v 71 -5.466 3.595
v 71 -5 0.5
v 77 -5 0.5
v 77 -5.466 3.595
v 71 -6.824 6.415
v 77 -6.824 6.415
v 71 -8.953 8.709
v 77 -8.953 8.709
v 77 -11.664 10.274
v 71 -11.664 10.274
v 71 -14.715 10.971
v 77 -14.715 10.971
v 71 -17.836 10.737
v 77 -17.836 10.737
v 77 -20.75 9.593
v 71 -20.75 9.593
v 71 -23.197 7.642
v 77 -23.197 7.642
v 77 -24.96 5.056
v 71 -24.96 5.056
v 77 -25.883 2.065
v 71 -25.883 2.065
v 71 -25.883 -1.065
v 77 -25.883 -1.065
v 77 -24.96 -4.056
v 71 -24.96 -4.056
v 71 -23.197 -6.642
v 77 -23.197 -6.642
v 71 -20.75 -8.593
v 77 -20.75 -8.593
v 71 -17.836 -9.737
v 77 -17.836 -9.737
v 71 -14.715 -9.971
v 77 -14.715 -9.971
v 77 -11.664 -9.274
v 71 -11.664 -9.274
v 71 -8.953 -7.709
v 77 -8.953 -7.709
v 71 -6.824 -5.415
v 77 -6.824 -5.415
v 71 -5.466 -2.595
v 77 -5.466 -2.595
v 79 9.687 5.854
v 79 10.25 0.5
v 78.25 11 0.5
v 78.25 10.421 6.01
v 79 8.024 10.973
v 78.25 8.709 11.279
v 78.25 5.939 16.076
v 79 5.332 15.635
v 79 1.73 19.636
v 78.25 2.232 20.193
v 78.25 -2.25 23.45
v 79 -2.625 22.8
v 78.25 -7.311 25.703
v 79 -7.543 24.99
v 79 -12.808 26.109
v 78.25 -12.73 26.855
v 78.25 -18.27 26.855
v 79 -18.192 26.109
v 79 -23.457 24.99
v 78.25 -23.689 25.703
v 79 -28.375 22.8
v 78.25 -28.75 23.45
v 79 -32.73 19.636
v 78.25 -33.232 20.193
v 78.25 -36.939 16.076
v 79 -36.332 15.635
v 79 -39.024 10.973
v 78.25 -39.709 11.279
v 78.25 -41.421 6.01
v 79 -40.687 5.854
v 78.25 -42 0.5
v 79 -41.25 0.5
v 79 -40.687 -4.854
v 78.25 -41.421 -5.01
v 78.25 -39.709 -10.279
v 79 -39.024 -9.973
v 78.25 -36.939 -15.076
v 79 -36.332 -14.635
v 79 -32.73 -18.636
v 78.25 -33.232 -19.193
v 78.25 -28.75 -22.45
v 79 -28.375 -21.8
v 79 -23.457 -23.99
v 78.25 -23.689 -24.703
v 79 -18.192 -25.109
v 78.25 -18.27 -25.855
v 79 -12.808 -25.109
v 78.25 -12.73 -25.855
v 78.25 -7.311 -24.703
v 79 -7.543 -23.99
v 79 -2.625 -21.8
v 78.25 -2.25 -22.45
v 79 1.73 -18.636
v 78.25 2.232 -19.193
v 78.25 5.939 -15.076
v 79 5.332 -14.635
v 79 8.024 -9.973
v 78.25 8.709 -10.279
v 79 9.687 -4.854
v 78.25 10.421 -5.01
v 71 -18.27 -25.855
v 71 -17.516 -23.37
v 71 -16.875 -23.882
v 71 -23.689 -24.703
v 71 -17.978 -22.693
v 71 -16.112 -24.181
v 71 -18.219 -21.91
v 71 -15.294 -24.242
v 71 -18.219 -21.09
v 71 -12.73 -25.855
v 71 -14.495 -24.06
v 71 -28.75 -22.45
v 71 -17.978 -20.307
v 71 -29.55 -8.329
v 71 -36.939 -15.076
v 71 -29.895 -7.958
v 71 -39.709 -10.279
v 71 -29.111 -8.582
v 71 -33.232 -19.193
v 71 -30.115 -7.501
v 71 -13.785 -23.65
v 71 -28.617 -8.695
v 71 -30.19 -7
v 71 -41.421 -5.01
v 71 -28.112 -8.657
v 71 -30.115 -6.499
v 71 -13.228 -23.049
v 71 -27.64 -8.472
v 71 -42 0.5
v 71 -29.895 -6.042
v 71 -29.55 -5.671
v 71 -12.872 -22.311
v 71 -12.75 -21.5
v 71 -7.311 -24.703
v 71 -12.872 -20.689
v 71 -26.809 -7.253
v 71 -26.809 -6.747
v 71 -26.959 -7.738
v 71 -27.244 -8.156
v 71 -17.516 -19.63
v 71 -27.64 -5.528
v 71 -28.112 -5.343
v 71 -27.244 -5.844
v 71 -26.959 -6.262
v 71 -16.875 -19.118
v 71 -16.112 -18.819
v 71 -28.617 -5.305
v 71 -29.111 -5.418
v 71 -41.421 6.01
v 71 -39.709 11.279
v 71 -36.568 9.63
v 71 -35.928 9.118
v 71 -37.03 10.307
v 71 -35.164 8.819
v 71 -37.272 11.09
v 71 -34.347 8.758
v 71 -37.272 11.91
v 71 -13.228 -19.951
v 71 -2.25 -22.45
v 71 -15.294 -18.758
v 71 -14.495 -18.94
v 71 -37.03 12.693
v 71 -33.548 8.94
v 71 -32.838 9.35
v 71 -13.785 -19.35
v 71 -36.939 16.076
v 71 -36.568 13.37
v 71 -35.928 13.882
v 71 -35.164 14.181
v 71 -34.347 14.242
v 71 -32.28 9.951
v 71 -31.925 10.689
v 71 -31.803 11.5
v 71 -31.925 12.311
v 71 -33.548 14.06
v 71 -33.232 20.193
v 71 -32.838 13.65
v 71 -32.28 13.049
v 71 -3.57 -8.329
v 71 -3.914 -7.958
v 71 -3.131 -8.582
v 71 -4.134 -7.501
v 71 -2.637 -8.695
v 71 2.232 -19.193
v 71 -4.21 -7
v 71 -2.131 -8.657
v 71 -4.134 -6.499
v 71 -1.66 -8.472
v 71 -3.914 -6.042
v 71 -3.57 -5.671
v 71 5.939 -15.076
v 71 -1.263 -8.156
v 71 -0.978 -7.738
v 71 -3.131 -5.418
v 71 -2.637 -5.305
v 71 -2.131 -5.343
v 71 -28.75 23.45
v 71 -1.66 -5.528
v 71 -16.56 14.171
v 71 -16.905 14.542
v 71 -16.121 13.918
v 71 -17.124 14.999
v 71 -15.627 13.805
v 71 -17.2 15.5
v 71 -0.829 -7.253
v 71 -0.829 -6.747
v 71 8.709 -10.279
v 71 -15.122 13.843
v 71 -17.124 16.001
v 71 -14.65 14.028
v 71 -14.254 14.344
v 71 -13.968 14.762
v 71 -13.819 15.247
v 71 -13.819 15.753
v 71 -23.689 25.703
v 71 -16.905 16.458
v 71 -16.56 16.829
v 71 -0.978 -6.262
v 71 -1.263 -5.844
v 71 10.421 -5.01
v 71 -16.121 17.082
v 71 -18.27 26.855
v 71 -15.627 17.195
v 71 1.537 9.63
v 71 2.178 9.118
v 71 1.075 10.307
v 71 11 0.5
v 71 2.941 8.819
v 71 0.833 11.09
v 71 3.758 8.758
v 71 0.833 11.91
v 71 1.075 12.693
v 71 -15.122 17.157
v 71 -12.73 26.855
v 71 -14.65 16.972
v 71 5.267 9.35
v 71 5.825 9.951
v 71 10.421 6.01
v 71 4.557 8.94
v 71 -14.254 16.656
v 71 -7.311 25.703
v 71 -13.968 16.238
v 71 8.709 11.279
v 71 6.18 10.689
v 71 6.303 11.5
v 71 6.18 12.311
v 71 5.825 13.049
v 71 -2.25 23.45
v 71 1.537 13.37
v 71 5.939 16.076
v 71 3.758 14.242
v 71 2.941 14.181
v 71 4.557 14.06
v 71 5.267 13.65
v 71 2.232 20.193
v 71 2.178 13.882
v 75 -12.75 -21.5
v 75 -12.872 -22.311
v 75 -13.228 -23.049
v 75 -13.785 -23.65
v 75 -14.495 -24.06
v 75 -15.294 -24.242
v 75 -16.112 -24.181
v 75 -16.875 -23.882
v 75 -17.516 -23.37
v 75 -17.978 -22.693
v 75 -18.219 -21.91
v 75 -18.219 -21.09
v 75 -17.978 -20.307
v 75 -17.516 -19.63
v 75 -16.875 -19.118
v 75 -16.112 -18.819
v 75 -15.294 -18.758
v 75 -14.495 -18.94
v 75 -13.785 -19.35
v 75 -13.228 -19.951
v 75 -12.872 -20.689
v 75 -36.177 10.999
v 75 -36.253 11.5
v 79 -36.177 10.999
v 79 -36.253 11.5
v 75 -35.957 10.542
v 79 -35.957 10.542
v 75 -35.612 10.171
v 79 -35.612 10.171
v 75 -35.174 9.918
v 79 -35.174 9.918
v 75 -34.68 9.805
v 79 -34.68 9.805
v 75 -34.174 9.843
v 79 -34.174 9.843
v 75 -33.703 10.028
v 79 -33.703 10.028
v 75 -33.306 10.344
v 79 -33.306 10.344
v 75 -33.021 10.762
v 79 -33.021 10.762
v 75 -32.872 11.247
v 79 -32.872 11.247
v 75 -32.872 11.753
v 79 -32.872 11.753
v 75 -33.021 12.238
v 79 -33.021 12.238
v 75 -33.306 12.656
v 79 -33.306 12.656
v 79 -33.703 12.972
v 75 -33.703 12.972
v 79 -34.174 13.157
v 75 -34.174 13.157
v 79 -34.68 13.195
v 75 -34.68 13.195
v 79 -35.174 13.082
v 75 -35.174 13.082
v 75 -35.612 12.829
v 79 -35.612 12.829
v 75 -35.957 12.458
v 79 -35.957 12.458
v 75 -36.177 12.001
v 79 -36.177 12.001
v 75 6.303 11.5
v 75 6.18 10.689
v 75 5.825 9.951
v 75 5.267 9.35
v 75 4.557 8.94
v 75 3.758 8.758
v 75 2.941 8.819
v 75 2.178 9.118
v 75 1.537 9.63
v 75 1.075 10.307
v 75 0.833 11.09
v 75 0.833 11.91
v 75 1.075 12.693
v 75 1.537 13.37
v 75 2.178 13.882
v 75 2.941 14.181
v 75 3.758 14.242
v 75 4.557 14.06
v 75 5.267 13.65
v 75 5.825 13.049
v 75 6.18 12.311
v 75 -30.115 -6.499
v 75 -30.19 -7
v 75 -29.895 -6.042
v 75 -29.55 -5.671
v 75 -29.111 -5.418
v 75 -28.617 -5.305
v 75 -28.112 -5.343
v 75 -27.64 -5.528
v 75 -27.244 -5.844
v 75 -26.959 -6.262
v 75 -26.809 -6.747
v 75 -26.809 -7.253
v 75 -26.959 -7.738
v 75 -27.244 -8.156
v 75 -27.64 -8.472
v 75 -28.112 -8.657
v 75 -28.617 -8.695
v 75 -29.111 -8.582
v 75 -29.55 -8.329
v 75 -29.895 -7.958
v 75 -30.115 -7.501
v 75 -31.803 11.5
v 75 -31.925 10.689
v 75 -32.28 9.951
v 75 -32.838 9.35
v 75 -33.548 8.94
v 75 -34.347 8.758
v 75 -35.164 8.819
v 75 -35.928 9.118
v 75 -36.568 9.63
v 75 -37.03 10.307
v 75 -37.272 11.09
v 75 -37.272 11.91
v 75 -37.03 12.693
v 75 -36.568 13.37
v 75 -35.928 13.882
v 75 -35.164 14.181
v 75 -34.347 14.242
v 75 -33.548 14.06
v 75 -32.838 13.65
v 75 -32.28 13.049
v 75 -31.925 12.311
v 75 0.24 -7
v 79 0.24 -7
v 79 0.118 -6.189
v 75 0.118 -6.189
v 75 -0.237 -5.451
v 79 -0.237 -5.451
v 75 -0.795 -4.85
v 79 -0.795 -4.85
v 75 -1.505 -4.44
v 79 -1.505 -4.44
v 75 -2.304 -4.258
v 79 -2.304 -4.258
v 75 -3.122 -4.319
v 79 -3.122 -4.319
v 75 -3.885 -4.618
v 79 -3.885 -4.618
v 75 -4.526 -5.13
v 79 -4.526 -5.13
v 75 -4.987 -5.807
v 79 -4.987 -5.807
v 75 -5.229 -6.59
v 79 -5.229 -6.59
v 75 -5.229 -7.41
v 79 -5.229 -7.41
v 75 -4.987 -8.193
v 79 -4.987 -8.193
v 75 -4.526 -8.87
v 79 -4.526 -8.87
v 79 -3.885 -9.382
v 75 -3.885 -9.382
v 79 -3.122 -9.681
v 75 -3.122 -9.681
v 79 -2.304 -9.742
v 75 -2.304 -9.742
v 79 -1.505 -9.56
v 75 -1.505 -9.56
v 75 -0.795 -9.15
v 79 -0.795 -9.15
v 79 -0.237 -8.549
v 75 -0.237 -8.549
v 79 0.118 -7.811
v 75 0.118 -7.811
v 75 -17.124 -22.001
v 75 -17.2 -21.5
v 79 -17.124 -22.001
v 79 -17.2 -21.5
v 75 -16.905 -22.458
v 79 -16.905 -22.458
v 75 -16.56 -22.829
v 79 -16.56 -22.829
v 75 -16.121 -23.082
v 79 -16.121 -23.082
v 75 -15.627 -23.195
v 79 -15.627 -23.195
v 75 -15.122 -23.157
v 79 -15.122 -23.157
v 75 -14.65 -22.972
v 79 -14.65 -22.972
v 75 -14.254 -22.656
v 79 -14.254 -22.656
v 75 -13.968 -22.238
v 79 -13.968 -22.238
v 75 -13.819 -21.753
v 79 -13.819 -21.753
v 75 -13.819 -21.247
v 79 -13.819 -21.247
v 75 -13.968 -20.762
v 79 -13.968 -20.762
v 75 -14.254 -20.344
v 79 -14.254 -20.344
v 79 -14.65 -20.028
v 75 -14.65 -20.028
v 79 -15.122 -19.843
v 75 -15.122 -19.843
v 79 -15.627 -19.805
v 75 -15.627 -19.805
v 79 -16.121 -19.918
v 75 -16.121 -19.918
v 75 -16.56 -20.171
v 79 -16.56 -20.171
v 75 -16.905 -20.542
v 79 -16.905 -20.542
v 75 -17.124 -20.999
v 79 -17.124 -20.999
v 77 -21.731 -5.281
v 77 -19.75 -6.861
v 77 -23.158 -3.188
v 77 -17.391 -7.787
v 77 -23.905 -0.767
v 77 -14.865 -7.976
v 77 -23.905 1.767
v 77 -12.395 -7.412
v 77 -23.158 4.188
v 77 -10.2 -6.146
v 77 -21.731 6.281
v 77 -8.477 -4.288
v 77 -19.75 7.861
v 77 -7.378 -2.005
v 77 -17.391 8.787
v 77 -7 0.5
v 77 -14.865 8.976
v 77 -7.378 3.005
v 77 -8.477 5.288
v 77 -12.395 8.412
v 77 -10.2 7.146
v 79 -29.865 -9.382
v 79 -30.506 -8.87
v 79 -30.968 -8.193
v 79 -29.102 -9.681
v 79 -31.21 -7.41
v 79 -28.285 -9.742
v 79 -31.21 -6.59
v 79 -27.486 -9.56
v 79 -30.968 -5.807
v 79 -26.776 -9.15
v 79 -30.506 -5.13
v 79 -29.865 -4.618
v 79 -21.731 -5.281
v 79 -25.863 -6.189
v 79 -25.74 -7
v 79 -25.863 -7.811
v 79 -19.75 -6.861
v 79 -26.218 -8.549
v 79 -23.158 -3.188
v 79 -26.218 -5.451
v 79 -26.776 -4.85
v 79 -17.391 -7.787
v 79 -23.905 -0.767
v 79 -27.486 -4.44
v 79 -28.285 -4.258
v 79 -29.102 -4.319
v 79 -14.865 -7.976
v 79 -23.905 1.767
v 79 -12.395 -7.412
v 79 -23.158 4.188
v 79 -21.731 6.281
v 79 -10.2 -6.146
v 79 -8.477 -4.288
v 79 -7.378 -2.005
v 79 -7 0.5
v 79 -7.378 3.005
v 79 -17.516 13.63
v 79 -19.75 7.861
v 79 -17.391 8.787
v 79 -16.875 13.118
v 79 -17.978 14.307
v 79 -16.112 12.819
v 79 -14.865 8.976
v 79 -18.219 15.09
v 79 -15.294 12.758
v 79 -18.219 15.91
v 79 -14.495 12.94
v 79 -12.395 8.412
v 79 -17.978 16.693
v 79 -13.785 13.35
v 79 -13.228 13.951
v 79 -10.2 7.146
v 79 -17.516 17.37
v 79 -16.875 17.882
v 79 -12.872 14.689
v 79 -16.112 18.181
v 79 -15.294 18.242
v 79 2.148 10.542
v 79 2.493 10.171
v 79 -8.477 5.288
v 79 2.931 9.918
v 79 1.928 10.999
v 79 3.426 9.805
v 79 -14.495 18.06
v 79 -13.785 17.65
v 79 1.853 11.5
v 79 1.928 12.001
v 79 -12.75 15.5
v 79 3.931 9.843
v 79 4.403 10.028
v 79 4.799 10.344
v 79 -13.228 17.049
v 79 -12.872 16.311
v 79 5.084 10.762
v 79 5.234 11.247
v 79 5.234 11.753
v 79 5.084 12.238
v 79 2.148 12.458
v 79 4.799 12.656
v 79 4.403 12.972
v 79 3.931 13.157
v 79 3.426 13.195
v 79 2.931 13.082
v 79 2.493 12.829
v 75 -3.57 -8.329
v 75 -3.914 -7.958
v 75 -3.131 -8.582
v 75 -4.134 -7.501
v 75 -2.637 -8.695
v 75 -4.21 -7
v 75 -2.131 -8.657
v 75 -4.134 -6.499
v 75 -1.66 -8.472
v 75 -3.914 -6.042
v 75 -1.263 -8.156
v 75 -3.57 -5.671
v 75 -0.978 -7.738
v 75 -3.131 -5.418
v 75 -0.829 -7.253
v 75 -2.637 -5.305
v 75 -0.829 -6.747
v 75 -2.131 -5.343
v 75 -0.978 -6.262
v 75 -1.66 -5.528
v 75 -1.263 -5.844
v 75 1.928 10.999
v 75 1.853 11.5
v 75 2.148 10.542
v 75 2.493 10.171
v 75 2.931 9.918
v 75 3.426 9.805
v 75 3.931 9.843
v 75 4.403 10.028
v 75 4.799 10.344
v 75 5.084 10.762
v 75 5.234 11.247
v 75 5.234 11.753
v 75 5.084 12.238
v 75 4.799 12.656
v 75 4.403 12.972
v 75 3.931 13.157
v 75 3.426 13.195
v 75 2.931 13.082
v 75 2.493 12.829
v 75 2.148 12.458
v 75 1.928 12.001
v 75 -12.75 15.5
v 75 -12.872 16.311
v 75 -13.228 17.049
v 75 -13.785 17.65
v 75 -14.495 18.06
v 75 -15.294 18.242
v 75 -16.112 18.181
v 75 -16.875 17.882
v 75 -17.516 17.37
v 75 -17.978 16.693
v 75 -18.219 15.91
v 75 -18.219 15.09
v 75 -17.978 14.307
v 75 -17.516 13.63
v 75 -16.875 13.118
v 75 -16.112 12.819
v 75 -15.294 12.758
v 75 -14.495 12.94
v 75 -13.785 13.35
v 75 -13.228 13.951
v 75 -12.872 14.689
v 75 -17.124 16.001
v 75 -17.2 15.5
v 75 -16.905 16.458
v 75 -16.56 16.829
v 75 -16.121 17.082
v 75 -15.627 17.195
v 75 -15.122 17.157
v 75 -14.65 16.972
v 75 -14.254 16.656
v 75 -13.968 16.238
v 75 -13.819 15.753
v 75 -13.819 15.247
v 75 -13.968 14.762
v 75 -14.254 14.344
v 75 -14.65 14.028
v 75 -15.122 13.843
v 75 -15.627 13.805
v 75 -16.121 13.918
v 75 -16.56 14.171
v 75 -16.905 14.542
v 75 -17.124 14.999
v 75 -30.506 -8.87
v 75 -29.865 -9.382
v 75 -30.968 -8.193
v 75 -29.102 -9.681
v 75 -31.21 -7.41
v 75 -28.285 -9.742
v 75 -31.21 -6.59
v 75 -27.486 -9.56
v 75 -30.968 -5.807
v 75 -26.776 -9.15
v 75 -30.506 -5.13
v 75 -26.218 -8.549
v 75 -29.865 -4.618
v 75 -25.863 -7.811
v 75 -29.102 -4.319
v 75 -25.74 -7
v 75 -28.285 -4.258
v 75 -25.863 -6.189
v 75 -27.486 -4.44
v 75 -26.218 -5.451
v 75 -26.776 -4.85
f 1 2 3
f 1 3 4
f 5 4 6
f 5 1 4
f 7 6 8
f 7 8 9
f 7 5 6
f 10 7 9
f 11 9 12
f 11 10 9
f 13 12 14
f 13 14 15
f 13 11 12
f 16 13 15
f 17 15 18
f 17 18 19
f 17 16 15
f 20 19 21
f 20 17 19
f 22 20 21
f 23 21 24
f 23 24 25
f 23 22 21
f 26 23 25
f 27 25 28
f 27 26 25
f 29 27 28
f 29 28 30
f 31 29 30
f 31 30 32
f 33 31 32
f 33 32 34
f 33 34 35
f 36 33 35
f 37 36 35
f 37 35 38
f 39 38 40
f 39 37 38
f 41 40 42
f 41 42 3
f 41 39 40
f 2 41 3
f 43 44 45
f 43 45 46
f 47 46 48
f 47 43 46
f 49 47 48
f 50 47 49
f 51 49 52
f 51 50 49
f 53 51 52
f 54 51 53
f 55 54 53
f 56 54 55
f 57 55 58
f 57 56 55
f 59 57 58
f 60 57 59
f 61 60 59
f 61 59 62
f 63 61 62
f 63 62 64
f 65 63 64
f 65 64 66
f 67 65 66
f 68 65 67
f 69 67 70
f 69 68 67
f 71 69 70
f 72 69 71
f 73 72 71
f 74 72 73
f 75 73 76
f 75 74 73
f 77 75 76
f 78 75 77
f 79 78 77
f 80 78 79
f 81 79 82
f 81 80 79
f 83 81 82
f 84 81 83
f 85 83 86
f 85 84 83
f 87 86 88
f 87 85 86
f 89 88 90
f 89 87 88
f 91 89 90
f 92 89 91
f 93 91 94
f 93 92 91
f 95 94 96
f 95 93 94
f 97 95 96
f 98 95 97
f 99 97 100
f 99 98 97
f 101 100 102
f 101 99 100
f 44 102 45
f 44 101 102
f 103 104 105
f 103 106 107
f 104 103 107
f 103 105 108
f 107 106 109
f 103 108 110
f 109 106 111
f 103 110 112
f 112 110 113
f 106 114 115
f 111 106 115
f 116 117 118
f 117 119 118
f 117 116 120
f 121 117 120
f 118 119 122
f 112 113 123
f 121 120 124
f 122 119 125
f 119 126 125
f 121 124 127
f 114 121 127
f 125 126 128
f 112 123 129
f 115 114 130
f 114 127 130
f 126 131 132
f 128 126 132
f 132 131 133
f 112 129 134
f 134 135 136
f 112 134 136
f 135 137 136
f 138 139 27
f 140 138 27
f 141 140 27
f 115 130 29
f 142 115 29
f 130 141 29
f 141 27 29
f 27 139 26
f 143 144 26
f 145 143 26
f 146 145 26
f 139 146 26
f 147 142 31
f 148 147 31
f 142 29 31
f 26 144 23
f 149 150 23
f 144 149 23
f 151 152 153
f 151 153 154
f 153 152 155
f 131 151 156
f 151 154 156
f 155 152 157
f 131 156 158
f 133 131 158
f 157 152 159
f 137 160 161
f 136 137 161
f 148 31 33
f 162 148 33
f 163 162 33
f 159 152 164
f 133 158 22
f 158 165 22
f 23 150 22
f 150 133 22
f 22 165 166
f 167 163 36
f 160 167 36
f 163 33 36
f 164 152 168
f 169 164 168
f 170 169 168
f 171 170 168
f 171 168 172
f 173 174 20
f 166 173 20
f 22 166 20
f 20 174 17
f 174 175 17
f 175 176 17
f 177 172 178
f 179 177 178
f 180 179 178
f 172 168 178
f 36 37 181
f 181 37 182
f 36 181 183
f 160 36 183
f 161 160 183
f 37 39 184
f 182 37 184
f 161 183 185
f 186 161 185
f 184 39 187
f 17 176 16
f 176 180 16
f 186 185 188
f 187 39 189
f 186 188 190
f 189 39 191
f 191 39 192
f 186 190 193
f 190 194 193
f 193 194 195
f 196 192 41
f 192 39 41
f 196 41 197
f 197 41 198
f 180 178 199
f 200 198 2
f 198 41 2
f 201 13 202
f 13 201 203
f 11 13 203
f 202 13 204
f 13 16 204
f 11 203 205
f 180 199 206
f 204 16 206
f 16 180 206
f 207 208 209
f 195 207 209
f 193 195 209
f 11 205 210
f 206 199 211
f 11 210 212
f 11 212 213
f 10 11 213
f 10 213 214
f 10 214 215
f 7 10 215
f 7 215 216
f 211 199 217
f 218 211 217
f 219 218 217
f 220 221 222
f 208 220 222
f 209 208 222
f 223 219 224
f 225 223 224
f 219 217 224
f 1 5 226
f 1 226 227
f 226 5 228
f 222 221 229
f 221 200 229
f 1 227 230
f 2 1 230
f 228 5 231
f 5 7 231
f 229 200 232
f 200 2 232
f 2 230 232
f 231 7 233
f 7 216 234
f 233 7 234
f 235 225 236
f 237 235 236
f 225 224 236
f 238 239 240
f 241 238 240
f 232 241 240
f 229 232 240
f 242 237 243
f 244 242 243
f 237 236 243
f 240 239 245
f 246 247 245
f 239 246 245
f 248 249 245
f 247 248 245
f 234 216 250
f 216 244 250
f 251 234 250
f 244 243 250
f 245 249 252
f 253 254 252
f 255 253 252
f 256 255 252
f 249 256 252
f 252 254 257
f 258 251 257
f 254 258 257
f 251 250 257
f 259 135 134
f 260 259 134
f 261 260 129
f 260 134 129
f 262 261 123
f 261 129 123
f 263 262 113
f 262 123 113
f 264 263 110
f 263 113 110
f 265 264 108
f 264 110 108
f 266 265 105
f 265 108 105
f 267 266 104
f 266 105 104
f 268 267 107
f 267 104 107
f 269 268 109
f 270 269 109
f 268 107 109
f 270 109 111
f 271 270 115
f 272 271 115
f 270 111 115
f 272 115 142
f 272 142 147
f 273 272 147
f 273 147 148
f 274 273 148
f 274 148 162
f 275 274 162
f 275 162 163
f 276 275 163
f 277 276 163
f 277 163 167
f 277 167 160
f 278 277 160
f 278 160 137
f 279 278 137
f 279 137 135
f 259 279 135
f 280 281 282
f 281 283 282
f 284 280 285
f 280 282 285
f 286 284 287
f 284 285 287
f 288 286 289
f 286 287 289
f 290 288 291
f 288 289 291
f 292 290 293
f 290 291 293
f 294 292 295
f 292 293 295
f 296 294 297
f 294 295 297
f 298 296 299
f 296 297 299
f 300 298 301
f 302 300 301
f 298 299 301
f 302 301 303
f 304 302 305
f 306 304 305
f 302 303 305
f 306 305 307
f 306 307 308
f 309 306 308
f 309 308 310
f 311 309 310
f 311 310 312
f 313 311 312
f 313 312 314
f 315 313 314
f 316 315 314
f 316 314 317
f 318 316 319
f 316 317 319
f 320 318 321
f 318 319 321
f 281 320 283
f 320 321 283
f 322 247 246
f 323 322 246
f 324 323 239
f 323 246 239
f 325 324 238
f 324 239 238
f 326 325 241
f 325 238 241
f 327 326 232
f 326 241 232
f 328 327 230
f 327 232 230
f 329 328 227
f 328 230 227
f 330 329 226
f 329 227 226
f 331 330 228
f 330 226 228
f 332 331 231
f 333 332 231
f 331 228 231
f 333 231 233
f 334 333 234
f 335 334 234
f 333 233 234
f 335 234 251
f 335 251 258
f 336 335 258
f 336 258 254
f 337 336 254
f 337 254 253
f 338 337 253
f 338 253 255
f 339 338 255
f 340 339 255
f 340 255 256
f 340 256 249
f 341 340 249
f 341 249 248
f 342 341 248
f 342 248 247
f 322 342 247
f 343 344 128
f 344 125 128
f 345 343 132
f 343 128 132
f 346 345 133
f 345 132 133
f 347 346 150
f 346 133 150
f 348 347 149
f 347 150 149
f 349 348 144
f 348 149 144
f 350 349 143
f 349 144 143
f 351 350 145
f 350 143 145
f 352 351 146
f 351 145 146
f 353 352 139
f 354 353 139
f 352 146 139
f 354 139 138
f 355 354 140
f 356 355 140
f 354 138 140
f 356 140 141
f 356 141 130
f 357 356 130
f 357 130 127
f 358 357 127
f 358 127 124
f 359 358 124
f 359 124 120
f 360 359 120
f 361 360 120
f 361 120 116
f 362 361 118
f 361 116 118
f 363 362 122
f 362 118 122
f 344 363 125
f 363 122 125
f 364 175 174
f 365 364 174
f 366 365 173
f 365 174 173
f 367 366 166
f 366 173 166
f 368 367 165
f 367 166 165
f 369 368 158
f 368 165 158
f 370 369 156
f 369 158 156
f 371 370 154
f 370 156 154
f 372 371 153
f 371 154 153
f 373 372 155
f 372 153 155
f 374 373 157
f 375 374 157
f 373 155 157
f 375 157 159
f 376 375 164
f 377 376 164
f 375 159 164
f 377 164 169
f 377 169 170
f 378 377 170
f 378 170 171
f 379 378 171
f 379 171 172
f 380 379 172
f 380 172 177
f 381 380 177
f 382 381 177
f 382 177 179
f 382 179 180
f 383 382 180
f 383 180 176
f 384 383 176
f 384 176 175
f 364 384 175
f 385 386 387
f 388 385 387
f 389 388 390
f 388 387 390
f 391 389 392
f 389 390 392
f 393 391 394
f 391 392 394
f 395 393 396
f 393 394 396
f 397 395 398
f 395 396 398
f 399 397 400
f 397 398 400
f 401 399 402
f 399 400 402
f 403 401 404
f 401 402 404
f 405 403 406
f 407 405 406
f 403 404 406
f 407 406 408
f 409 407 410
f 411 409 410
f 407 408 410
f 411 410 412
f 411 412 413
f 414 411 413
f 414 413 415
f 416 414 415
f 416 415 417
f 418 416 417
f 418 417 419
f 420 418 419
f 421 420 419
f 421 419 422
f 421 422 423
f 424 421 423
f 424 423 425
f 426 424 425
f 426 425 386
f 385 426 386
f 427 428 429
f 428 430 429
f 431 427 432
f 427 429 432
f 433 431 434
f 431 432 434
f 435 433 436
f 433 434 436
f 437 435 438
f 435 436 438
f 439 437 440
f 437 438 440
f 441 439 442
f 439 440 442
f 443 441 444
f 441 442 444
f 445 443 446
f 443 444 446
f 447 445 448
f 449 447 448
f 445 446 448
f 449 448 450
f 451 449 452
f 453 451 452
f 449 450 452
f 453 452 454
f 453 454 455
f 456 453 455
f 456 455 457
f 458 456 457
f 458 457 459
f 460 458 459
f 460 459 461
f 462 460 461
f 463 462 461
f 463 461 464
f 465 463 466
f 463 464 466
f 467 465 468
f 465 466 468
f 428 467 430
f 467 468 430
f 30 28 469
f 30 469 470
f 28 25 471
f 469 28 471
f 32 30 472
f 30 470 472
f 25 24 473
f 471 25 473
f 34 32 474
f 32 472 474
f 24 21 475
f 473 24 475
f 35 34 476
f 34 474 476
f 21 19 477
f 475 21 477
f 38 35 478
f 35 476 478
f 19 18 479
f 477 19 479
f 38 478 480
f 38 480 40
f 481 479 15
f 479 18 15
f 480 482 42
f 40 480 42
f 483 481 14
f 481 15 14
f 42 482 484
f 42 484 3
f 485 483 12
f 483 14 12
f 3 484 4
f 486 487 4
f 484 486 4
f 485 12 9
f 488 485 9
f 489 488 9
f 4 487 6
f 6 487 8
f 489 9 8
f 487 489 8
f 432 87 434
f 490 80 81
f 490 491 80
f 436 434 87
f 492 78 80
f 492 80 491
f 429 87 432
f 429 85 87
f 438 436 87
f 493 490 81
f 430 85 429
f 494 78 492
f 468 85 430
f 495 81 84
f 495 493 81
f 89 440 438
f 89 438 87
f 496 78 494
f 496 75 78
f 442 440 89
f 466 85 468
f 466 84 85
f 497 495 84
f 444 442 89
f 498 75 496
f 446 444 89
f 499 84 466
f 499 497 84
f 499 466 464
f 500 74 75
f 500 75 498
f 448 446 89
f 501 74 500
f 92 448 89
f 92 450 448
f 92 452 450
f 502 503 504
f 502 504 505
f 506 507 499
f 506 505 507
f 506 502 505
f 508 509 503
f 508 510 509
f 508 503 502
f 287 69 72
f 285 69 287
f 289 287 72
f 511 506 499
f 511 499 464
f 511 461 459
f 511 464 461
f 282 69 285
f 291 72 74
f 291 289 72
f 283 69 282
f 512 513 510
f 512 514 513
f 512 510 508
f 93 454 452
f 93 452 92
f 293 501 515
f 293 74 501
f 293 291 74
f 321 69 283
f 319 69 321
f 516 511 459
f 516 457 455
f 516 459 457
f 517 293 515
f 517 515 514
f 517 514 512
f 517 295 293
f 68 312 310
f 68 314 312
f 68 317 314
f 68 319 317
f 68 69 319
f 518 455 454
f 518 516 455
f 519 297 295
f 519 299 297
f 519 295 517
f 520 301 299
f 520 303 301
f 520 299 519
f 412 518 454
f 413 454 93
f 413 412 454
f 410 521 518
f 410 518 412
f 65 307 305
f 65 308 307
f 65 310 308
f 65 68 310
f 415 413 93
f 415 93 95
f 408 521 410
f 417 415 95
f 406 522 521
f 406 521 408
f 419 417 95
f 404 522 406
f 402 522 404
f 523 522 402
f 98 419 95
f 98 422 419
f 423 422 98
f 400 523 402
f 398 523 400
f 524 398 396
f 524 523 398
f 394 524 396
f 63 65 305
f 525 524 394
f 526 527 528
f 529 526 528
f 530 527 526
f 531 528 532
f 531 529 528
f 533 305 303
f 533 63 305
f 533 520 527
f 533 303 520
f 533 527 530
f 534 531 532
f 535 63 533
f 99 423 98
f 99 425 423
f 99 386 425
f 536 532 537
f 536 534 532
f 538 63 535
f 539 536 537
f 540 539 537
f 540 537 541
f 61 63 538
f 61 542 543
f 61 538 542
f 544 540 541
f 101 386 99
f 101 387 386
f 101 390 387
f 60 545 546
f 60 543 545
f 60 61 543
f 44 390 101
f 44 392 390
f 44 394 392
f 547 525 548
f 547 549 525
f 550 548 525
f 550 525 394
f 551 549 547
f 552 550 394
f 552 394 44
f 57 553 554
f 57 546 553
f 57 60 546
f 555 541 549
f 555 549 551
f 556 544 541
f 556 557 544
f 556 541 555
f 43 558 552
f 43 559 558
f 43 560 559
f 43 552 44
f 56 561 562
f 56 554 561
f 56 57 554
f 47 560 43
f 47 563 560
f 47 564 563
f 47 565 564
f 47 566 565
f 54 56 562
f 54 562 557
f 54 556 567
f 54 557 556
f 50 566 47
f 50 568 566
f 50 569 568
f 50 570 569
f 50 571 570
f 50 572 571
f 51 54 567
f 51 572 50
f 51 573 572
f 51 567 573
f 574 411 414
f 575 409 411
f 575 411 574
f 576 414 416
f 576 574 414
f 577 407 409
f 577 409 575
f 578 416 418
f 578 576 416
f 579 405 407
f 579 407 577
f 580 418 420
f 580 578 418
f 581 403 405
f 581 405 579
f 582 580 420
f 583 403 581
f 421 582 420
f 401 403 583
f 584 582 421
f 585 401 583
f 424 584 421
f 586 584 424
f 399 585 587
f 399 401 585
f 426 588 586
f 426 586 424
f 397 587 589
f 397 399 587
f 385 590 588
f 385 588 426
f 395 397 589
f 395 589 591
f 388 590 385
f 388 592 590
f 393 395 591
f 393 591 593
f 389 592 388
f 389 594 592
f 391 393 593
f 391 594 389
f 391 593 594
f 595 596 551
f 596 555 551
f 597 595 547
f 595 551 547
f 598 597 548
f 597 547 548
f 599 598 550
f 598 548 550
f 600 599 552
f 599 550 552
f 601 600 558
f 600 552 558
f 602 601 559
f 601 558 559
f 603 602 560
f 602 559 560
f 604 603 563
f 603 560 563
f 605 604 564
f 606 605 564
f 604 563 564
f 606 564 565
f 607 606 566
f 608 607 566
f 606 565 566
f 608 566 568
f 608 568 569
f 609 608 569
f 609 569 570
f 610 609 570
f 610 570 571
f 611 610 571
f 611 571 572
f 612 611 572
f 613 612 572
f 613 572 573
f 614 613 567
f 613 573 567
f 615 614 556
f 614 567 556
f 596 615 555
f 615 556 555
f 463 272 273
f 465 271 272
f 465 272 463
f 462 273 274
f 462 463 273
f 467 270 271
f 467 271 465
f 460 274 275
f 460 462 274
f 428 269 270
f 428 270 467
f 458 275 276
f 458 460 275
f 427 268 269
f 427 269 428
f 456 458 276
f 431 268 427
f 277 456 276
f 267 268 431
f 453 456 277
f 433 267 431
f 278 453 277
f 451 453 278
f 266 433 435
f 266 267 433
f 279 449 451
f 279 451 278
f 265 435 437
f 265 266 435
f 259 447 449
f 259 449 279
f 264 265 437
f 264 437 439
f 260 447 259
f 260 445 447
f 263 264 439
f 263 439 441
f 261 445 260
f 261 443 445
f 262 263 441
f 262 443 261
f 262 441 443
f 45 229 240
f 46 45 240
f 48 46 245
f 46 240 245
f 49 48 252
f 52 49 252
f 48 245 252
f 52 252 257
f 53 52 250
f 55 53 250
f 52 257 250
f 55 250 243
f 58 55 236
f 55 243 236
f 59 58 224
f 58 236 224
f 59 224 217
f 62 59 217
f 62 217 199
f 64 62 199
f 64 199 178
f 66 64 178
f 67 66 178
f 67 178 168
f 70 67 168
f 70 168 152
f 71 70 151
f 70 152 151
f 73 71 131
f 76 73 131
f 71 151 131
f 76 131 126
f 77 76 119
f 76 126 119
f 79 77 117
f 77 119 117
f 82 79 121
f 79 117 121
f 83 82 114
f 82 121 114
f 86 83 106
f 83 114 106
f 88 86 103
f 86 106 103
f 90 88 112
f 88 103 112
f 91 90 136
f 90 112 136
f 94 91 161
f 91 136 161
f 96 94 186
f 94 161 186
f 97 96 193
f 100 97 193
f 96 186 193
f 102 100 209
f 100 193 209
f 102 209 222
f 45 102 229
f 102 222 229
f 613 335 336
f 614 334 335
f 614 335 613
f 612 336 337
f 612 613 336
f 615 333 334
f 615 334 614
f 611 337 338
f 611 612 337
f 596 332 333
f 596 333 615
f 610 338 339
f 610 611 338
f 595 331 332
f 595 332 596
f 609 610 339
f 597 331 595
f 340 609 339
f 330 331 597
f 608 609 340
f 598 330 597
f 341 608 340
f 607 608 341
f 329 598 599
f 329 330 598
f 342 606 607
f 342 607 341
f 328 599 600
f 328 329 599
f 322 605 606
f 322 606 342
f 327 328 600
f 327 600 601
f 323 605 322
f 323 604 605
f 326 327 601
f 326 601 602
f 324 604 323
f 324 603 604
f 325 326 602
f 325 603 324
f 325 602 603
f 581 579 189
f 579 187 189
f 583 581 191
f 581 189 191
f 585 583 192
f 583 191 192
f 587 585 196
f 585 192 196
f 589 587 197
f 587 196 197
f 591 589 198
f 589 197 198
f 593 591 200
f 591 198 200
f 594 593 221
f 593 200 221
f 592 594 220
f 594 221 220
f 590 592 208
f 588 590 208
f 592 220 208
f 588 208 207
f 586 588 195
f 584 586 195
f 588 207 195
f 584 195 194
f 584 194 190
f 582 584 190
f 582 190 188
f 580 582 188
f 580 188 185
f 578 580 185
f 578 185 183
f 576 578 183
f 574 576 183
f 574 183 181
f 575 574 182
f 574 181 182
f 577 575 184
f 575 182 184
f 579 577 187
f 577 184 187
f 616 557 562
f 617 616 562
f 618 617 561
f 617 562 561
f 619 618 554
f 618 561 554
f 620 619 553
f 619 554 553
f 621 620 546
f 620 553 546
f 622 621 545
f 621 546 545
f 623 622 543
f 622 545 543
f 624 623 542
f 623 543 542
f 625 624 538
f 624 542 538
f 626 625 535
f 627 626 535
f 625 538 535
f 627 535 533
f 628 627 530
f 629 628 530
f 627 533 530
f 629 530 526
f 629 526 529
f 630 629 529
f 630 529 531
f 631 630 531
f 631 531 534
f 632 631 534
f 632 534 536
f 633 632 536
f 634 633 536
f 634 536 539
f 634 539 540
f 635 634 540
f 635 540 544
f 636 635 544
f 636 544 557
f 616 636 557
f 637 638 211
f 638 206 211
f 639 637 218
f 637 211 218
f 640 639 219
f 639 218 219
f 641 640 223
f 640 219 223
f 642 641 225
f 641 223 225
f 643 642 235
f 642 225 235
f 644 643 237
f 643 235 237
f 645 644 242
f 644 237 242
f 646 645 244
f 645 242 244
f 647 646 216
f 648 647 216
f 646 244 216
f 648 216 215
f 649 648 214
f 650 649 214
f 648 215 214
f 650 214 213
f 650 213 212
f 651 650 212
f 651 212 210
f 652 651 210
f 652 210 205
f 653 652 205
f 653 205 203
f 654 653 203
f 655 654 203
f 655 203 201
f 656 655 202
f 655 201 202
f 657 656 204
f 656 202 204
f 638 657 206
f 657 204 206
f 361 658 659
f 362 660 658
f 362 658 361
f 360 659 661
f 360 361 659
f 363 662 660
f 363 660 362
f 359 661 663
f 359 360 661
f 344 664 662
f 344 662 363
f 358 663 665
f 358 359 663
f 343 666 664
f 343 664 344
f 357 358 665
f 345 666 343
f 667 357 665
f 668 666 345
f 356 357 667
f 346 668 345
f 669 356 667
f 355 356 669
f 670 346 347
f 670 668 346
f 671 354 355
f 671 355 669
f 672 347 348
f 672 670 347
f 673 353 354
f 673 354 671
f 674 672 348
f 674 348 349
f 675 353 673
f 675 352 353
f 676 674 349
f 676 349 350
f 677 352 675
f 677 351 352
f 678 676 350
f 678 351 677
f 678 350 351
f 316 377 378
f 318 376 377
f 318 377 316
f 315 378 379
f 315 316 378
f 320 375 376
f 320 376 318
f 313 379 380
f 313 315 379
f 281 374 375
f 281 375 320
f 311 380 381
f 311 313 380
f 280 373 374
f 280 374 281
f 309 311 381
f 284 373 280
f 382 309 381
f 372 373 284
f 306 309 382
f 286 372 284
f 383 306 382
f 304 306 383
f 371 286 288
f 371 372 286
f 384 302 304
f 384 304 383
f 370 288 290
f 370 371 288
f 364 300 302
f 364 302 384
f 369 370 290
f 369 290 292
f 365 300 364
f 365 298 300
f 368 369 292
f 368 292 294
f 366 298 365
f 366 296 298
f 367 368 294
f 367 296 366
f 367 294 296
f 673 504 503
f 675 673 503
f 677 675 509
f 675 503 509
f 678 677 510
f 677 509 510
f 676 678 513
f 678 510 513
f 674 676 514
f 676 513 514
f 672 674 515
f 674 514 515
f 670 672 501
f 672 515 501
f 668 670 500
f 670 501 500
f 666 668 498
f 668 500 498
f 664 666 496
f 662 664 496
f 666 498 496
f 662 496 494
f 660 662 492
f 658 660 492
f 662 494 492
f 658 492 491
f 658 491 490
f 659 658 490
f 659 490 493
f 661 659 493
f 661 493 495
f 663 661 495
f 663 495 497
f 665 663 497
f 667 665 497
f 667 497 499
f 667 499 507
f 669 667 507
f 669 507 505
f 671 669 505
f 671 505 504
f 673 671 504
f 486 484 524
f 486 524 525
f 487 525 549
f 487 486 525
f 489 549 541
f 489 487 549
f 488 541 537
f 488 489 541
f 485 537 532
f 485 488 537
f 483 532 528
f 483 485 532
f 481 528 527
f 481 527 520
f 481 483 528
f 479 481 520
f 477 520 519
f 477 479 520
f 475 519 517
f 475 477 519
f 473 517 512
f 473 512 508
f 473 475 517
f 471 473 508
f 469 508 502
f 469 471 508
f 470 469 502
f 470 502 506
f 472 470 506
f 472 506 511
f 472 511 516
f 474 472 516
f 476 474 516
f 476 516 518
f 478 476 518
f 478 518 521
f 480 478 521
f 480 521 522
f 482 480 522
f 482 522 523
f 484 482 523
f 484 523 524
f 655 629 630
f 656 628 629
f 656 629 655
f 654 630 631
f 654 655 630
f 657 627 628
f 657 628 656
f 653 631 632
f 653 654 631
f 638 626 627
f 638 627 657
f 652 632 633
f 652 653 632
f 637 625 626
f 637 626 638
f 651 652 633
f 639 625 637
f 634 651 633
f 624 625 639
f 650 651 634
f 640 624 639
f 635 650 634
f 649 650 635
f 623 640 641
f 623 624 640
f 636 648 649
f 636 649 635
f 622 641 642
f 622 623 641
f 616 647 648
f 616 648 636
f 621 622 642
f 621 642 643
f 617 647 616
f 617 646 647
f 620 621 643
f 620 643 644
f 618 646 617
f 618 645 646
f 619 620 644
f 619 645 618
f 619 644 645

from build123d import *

# Parameters (mm, degrees)
SKETCH046_R         = 26.5
SKETCH046_R_2       = 8.5
SKETCH046_R_3       = 1.65
PAD029_DEPTH        = 8
SKETCH048_R         = 10.5
POCKET014_DEPTH     = 6
HOLE003_D           = 3.4
HOLE003_CBORE_D     = 5.5
HOLE003_CBORE_DEPTH = 4
HOLE004_D           = 3.4
HOLE004_CBORE_D     = 5.5
HOLE004_CBORE_DEPTH = 4
CHAMFER016_SIZE     = 0.75


with BuildPart() as part:
    # Sketch046 → Pad029 (new body)
    with BuildSketch(Plane.YZ.offset(69)):
        with Locations((-10, -6)):
            Circle(SKETCH046_R)
        with Locations((-10, -6)):
            Circle(SKETCH046_R_2, mode=Mode.SUBTRACT)
        with Locations((-10, 9)):
            Circle(SKETCH046_R_3, mode=Mode.SUBTRACT)
        with Locations((2.990381, -13.5)):
            Circle(SKETCH046_R_3, mode=Mode.SUBTRACT)
        with Locations((-22.990381, -13.5)):
            Circle(SKETCH046_R_3, mode=Mode.SUBTRACT)
    extrude(amount=PAD029_DEPTH)

    # Sketch048 → Pocket014 (cut)
    with BuildSketch(Plane.YZ.offset(69)):
        with Locations((-10, -6)):
            Circle(SKETCH048_R)
    extrude(amount=POCKET014_DEPTH, mode=Mode.SUBTRACT)

    # Hole003 (through all)
    with Locations(Plane(origin=(69, 0, 0), x_dir=(0, 1, 0), z_dir=(-1, 0, 0))):
        with Locations((-29.052559, -5), (9.052559, -5), (-10, 28)):
            CounterBoreHole(HOLE003_D / 2, HOLE003_CBORE_D / 2, HOLE003_CBORE_DEPTH)

    # Hole004 (through all)
    with Locations(Plane.YZ.offset(77)):
        with Locations((-22.990381, -13.5), (-10, 9), (2.990381, -13.5)):
            CounterBoreHole(HOLE004_D / 2, HOLE004_CBORE_D / 2, HOLE004_CBORE_DEPTH)

    # Chamfer016
    chamfer016_edges = [part.edges().sort_by_distance(p)[0] for p in [
        (77, -36.5, -6),
    ]]
    chamfer(chamfer016_edges, length=CHAMFER016_SIZE)


with BuildPart() as part_1:
    # Body011 placement: moved
    add(part.part.moved(Location((2, -5.5, 6.5))))


solid = part_1.part
